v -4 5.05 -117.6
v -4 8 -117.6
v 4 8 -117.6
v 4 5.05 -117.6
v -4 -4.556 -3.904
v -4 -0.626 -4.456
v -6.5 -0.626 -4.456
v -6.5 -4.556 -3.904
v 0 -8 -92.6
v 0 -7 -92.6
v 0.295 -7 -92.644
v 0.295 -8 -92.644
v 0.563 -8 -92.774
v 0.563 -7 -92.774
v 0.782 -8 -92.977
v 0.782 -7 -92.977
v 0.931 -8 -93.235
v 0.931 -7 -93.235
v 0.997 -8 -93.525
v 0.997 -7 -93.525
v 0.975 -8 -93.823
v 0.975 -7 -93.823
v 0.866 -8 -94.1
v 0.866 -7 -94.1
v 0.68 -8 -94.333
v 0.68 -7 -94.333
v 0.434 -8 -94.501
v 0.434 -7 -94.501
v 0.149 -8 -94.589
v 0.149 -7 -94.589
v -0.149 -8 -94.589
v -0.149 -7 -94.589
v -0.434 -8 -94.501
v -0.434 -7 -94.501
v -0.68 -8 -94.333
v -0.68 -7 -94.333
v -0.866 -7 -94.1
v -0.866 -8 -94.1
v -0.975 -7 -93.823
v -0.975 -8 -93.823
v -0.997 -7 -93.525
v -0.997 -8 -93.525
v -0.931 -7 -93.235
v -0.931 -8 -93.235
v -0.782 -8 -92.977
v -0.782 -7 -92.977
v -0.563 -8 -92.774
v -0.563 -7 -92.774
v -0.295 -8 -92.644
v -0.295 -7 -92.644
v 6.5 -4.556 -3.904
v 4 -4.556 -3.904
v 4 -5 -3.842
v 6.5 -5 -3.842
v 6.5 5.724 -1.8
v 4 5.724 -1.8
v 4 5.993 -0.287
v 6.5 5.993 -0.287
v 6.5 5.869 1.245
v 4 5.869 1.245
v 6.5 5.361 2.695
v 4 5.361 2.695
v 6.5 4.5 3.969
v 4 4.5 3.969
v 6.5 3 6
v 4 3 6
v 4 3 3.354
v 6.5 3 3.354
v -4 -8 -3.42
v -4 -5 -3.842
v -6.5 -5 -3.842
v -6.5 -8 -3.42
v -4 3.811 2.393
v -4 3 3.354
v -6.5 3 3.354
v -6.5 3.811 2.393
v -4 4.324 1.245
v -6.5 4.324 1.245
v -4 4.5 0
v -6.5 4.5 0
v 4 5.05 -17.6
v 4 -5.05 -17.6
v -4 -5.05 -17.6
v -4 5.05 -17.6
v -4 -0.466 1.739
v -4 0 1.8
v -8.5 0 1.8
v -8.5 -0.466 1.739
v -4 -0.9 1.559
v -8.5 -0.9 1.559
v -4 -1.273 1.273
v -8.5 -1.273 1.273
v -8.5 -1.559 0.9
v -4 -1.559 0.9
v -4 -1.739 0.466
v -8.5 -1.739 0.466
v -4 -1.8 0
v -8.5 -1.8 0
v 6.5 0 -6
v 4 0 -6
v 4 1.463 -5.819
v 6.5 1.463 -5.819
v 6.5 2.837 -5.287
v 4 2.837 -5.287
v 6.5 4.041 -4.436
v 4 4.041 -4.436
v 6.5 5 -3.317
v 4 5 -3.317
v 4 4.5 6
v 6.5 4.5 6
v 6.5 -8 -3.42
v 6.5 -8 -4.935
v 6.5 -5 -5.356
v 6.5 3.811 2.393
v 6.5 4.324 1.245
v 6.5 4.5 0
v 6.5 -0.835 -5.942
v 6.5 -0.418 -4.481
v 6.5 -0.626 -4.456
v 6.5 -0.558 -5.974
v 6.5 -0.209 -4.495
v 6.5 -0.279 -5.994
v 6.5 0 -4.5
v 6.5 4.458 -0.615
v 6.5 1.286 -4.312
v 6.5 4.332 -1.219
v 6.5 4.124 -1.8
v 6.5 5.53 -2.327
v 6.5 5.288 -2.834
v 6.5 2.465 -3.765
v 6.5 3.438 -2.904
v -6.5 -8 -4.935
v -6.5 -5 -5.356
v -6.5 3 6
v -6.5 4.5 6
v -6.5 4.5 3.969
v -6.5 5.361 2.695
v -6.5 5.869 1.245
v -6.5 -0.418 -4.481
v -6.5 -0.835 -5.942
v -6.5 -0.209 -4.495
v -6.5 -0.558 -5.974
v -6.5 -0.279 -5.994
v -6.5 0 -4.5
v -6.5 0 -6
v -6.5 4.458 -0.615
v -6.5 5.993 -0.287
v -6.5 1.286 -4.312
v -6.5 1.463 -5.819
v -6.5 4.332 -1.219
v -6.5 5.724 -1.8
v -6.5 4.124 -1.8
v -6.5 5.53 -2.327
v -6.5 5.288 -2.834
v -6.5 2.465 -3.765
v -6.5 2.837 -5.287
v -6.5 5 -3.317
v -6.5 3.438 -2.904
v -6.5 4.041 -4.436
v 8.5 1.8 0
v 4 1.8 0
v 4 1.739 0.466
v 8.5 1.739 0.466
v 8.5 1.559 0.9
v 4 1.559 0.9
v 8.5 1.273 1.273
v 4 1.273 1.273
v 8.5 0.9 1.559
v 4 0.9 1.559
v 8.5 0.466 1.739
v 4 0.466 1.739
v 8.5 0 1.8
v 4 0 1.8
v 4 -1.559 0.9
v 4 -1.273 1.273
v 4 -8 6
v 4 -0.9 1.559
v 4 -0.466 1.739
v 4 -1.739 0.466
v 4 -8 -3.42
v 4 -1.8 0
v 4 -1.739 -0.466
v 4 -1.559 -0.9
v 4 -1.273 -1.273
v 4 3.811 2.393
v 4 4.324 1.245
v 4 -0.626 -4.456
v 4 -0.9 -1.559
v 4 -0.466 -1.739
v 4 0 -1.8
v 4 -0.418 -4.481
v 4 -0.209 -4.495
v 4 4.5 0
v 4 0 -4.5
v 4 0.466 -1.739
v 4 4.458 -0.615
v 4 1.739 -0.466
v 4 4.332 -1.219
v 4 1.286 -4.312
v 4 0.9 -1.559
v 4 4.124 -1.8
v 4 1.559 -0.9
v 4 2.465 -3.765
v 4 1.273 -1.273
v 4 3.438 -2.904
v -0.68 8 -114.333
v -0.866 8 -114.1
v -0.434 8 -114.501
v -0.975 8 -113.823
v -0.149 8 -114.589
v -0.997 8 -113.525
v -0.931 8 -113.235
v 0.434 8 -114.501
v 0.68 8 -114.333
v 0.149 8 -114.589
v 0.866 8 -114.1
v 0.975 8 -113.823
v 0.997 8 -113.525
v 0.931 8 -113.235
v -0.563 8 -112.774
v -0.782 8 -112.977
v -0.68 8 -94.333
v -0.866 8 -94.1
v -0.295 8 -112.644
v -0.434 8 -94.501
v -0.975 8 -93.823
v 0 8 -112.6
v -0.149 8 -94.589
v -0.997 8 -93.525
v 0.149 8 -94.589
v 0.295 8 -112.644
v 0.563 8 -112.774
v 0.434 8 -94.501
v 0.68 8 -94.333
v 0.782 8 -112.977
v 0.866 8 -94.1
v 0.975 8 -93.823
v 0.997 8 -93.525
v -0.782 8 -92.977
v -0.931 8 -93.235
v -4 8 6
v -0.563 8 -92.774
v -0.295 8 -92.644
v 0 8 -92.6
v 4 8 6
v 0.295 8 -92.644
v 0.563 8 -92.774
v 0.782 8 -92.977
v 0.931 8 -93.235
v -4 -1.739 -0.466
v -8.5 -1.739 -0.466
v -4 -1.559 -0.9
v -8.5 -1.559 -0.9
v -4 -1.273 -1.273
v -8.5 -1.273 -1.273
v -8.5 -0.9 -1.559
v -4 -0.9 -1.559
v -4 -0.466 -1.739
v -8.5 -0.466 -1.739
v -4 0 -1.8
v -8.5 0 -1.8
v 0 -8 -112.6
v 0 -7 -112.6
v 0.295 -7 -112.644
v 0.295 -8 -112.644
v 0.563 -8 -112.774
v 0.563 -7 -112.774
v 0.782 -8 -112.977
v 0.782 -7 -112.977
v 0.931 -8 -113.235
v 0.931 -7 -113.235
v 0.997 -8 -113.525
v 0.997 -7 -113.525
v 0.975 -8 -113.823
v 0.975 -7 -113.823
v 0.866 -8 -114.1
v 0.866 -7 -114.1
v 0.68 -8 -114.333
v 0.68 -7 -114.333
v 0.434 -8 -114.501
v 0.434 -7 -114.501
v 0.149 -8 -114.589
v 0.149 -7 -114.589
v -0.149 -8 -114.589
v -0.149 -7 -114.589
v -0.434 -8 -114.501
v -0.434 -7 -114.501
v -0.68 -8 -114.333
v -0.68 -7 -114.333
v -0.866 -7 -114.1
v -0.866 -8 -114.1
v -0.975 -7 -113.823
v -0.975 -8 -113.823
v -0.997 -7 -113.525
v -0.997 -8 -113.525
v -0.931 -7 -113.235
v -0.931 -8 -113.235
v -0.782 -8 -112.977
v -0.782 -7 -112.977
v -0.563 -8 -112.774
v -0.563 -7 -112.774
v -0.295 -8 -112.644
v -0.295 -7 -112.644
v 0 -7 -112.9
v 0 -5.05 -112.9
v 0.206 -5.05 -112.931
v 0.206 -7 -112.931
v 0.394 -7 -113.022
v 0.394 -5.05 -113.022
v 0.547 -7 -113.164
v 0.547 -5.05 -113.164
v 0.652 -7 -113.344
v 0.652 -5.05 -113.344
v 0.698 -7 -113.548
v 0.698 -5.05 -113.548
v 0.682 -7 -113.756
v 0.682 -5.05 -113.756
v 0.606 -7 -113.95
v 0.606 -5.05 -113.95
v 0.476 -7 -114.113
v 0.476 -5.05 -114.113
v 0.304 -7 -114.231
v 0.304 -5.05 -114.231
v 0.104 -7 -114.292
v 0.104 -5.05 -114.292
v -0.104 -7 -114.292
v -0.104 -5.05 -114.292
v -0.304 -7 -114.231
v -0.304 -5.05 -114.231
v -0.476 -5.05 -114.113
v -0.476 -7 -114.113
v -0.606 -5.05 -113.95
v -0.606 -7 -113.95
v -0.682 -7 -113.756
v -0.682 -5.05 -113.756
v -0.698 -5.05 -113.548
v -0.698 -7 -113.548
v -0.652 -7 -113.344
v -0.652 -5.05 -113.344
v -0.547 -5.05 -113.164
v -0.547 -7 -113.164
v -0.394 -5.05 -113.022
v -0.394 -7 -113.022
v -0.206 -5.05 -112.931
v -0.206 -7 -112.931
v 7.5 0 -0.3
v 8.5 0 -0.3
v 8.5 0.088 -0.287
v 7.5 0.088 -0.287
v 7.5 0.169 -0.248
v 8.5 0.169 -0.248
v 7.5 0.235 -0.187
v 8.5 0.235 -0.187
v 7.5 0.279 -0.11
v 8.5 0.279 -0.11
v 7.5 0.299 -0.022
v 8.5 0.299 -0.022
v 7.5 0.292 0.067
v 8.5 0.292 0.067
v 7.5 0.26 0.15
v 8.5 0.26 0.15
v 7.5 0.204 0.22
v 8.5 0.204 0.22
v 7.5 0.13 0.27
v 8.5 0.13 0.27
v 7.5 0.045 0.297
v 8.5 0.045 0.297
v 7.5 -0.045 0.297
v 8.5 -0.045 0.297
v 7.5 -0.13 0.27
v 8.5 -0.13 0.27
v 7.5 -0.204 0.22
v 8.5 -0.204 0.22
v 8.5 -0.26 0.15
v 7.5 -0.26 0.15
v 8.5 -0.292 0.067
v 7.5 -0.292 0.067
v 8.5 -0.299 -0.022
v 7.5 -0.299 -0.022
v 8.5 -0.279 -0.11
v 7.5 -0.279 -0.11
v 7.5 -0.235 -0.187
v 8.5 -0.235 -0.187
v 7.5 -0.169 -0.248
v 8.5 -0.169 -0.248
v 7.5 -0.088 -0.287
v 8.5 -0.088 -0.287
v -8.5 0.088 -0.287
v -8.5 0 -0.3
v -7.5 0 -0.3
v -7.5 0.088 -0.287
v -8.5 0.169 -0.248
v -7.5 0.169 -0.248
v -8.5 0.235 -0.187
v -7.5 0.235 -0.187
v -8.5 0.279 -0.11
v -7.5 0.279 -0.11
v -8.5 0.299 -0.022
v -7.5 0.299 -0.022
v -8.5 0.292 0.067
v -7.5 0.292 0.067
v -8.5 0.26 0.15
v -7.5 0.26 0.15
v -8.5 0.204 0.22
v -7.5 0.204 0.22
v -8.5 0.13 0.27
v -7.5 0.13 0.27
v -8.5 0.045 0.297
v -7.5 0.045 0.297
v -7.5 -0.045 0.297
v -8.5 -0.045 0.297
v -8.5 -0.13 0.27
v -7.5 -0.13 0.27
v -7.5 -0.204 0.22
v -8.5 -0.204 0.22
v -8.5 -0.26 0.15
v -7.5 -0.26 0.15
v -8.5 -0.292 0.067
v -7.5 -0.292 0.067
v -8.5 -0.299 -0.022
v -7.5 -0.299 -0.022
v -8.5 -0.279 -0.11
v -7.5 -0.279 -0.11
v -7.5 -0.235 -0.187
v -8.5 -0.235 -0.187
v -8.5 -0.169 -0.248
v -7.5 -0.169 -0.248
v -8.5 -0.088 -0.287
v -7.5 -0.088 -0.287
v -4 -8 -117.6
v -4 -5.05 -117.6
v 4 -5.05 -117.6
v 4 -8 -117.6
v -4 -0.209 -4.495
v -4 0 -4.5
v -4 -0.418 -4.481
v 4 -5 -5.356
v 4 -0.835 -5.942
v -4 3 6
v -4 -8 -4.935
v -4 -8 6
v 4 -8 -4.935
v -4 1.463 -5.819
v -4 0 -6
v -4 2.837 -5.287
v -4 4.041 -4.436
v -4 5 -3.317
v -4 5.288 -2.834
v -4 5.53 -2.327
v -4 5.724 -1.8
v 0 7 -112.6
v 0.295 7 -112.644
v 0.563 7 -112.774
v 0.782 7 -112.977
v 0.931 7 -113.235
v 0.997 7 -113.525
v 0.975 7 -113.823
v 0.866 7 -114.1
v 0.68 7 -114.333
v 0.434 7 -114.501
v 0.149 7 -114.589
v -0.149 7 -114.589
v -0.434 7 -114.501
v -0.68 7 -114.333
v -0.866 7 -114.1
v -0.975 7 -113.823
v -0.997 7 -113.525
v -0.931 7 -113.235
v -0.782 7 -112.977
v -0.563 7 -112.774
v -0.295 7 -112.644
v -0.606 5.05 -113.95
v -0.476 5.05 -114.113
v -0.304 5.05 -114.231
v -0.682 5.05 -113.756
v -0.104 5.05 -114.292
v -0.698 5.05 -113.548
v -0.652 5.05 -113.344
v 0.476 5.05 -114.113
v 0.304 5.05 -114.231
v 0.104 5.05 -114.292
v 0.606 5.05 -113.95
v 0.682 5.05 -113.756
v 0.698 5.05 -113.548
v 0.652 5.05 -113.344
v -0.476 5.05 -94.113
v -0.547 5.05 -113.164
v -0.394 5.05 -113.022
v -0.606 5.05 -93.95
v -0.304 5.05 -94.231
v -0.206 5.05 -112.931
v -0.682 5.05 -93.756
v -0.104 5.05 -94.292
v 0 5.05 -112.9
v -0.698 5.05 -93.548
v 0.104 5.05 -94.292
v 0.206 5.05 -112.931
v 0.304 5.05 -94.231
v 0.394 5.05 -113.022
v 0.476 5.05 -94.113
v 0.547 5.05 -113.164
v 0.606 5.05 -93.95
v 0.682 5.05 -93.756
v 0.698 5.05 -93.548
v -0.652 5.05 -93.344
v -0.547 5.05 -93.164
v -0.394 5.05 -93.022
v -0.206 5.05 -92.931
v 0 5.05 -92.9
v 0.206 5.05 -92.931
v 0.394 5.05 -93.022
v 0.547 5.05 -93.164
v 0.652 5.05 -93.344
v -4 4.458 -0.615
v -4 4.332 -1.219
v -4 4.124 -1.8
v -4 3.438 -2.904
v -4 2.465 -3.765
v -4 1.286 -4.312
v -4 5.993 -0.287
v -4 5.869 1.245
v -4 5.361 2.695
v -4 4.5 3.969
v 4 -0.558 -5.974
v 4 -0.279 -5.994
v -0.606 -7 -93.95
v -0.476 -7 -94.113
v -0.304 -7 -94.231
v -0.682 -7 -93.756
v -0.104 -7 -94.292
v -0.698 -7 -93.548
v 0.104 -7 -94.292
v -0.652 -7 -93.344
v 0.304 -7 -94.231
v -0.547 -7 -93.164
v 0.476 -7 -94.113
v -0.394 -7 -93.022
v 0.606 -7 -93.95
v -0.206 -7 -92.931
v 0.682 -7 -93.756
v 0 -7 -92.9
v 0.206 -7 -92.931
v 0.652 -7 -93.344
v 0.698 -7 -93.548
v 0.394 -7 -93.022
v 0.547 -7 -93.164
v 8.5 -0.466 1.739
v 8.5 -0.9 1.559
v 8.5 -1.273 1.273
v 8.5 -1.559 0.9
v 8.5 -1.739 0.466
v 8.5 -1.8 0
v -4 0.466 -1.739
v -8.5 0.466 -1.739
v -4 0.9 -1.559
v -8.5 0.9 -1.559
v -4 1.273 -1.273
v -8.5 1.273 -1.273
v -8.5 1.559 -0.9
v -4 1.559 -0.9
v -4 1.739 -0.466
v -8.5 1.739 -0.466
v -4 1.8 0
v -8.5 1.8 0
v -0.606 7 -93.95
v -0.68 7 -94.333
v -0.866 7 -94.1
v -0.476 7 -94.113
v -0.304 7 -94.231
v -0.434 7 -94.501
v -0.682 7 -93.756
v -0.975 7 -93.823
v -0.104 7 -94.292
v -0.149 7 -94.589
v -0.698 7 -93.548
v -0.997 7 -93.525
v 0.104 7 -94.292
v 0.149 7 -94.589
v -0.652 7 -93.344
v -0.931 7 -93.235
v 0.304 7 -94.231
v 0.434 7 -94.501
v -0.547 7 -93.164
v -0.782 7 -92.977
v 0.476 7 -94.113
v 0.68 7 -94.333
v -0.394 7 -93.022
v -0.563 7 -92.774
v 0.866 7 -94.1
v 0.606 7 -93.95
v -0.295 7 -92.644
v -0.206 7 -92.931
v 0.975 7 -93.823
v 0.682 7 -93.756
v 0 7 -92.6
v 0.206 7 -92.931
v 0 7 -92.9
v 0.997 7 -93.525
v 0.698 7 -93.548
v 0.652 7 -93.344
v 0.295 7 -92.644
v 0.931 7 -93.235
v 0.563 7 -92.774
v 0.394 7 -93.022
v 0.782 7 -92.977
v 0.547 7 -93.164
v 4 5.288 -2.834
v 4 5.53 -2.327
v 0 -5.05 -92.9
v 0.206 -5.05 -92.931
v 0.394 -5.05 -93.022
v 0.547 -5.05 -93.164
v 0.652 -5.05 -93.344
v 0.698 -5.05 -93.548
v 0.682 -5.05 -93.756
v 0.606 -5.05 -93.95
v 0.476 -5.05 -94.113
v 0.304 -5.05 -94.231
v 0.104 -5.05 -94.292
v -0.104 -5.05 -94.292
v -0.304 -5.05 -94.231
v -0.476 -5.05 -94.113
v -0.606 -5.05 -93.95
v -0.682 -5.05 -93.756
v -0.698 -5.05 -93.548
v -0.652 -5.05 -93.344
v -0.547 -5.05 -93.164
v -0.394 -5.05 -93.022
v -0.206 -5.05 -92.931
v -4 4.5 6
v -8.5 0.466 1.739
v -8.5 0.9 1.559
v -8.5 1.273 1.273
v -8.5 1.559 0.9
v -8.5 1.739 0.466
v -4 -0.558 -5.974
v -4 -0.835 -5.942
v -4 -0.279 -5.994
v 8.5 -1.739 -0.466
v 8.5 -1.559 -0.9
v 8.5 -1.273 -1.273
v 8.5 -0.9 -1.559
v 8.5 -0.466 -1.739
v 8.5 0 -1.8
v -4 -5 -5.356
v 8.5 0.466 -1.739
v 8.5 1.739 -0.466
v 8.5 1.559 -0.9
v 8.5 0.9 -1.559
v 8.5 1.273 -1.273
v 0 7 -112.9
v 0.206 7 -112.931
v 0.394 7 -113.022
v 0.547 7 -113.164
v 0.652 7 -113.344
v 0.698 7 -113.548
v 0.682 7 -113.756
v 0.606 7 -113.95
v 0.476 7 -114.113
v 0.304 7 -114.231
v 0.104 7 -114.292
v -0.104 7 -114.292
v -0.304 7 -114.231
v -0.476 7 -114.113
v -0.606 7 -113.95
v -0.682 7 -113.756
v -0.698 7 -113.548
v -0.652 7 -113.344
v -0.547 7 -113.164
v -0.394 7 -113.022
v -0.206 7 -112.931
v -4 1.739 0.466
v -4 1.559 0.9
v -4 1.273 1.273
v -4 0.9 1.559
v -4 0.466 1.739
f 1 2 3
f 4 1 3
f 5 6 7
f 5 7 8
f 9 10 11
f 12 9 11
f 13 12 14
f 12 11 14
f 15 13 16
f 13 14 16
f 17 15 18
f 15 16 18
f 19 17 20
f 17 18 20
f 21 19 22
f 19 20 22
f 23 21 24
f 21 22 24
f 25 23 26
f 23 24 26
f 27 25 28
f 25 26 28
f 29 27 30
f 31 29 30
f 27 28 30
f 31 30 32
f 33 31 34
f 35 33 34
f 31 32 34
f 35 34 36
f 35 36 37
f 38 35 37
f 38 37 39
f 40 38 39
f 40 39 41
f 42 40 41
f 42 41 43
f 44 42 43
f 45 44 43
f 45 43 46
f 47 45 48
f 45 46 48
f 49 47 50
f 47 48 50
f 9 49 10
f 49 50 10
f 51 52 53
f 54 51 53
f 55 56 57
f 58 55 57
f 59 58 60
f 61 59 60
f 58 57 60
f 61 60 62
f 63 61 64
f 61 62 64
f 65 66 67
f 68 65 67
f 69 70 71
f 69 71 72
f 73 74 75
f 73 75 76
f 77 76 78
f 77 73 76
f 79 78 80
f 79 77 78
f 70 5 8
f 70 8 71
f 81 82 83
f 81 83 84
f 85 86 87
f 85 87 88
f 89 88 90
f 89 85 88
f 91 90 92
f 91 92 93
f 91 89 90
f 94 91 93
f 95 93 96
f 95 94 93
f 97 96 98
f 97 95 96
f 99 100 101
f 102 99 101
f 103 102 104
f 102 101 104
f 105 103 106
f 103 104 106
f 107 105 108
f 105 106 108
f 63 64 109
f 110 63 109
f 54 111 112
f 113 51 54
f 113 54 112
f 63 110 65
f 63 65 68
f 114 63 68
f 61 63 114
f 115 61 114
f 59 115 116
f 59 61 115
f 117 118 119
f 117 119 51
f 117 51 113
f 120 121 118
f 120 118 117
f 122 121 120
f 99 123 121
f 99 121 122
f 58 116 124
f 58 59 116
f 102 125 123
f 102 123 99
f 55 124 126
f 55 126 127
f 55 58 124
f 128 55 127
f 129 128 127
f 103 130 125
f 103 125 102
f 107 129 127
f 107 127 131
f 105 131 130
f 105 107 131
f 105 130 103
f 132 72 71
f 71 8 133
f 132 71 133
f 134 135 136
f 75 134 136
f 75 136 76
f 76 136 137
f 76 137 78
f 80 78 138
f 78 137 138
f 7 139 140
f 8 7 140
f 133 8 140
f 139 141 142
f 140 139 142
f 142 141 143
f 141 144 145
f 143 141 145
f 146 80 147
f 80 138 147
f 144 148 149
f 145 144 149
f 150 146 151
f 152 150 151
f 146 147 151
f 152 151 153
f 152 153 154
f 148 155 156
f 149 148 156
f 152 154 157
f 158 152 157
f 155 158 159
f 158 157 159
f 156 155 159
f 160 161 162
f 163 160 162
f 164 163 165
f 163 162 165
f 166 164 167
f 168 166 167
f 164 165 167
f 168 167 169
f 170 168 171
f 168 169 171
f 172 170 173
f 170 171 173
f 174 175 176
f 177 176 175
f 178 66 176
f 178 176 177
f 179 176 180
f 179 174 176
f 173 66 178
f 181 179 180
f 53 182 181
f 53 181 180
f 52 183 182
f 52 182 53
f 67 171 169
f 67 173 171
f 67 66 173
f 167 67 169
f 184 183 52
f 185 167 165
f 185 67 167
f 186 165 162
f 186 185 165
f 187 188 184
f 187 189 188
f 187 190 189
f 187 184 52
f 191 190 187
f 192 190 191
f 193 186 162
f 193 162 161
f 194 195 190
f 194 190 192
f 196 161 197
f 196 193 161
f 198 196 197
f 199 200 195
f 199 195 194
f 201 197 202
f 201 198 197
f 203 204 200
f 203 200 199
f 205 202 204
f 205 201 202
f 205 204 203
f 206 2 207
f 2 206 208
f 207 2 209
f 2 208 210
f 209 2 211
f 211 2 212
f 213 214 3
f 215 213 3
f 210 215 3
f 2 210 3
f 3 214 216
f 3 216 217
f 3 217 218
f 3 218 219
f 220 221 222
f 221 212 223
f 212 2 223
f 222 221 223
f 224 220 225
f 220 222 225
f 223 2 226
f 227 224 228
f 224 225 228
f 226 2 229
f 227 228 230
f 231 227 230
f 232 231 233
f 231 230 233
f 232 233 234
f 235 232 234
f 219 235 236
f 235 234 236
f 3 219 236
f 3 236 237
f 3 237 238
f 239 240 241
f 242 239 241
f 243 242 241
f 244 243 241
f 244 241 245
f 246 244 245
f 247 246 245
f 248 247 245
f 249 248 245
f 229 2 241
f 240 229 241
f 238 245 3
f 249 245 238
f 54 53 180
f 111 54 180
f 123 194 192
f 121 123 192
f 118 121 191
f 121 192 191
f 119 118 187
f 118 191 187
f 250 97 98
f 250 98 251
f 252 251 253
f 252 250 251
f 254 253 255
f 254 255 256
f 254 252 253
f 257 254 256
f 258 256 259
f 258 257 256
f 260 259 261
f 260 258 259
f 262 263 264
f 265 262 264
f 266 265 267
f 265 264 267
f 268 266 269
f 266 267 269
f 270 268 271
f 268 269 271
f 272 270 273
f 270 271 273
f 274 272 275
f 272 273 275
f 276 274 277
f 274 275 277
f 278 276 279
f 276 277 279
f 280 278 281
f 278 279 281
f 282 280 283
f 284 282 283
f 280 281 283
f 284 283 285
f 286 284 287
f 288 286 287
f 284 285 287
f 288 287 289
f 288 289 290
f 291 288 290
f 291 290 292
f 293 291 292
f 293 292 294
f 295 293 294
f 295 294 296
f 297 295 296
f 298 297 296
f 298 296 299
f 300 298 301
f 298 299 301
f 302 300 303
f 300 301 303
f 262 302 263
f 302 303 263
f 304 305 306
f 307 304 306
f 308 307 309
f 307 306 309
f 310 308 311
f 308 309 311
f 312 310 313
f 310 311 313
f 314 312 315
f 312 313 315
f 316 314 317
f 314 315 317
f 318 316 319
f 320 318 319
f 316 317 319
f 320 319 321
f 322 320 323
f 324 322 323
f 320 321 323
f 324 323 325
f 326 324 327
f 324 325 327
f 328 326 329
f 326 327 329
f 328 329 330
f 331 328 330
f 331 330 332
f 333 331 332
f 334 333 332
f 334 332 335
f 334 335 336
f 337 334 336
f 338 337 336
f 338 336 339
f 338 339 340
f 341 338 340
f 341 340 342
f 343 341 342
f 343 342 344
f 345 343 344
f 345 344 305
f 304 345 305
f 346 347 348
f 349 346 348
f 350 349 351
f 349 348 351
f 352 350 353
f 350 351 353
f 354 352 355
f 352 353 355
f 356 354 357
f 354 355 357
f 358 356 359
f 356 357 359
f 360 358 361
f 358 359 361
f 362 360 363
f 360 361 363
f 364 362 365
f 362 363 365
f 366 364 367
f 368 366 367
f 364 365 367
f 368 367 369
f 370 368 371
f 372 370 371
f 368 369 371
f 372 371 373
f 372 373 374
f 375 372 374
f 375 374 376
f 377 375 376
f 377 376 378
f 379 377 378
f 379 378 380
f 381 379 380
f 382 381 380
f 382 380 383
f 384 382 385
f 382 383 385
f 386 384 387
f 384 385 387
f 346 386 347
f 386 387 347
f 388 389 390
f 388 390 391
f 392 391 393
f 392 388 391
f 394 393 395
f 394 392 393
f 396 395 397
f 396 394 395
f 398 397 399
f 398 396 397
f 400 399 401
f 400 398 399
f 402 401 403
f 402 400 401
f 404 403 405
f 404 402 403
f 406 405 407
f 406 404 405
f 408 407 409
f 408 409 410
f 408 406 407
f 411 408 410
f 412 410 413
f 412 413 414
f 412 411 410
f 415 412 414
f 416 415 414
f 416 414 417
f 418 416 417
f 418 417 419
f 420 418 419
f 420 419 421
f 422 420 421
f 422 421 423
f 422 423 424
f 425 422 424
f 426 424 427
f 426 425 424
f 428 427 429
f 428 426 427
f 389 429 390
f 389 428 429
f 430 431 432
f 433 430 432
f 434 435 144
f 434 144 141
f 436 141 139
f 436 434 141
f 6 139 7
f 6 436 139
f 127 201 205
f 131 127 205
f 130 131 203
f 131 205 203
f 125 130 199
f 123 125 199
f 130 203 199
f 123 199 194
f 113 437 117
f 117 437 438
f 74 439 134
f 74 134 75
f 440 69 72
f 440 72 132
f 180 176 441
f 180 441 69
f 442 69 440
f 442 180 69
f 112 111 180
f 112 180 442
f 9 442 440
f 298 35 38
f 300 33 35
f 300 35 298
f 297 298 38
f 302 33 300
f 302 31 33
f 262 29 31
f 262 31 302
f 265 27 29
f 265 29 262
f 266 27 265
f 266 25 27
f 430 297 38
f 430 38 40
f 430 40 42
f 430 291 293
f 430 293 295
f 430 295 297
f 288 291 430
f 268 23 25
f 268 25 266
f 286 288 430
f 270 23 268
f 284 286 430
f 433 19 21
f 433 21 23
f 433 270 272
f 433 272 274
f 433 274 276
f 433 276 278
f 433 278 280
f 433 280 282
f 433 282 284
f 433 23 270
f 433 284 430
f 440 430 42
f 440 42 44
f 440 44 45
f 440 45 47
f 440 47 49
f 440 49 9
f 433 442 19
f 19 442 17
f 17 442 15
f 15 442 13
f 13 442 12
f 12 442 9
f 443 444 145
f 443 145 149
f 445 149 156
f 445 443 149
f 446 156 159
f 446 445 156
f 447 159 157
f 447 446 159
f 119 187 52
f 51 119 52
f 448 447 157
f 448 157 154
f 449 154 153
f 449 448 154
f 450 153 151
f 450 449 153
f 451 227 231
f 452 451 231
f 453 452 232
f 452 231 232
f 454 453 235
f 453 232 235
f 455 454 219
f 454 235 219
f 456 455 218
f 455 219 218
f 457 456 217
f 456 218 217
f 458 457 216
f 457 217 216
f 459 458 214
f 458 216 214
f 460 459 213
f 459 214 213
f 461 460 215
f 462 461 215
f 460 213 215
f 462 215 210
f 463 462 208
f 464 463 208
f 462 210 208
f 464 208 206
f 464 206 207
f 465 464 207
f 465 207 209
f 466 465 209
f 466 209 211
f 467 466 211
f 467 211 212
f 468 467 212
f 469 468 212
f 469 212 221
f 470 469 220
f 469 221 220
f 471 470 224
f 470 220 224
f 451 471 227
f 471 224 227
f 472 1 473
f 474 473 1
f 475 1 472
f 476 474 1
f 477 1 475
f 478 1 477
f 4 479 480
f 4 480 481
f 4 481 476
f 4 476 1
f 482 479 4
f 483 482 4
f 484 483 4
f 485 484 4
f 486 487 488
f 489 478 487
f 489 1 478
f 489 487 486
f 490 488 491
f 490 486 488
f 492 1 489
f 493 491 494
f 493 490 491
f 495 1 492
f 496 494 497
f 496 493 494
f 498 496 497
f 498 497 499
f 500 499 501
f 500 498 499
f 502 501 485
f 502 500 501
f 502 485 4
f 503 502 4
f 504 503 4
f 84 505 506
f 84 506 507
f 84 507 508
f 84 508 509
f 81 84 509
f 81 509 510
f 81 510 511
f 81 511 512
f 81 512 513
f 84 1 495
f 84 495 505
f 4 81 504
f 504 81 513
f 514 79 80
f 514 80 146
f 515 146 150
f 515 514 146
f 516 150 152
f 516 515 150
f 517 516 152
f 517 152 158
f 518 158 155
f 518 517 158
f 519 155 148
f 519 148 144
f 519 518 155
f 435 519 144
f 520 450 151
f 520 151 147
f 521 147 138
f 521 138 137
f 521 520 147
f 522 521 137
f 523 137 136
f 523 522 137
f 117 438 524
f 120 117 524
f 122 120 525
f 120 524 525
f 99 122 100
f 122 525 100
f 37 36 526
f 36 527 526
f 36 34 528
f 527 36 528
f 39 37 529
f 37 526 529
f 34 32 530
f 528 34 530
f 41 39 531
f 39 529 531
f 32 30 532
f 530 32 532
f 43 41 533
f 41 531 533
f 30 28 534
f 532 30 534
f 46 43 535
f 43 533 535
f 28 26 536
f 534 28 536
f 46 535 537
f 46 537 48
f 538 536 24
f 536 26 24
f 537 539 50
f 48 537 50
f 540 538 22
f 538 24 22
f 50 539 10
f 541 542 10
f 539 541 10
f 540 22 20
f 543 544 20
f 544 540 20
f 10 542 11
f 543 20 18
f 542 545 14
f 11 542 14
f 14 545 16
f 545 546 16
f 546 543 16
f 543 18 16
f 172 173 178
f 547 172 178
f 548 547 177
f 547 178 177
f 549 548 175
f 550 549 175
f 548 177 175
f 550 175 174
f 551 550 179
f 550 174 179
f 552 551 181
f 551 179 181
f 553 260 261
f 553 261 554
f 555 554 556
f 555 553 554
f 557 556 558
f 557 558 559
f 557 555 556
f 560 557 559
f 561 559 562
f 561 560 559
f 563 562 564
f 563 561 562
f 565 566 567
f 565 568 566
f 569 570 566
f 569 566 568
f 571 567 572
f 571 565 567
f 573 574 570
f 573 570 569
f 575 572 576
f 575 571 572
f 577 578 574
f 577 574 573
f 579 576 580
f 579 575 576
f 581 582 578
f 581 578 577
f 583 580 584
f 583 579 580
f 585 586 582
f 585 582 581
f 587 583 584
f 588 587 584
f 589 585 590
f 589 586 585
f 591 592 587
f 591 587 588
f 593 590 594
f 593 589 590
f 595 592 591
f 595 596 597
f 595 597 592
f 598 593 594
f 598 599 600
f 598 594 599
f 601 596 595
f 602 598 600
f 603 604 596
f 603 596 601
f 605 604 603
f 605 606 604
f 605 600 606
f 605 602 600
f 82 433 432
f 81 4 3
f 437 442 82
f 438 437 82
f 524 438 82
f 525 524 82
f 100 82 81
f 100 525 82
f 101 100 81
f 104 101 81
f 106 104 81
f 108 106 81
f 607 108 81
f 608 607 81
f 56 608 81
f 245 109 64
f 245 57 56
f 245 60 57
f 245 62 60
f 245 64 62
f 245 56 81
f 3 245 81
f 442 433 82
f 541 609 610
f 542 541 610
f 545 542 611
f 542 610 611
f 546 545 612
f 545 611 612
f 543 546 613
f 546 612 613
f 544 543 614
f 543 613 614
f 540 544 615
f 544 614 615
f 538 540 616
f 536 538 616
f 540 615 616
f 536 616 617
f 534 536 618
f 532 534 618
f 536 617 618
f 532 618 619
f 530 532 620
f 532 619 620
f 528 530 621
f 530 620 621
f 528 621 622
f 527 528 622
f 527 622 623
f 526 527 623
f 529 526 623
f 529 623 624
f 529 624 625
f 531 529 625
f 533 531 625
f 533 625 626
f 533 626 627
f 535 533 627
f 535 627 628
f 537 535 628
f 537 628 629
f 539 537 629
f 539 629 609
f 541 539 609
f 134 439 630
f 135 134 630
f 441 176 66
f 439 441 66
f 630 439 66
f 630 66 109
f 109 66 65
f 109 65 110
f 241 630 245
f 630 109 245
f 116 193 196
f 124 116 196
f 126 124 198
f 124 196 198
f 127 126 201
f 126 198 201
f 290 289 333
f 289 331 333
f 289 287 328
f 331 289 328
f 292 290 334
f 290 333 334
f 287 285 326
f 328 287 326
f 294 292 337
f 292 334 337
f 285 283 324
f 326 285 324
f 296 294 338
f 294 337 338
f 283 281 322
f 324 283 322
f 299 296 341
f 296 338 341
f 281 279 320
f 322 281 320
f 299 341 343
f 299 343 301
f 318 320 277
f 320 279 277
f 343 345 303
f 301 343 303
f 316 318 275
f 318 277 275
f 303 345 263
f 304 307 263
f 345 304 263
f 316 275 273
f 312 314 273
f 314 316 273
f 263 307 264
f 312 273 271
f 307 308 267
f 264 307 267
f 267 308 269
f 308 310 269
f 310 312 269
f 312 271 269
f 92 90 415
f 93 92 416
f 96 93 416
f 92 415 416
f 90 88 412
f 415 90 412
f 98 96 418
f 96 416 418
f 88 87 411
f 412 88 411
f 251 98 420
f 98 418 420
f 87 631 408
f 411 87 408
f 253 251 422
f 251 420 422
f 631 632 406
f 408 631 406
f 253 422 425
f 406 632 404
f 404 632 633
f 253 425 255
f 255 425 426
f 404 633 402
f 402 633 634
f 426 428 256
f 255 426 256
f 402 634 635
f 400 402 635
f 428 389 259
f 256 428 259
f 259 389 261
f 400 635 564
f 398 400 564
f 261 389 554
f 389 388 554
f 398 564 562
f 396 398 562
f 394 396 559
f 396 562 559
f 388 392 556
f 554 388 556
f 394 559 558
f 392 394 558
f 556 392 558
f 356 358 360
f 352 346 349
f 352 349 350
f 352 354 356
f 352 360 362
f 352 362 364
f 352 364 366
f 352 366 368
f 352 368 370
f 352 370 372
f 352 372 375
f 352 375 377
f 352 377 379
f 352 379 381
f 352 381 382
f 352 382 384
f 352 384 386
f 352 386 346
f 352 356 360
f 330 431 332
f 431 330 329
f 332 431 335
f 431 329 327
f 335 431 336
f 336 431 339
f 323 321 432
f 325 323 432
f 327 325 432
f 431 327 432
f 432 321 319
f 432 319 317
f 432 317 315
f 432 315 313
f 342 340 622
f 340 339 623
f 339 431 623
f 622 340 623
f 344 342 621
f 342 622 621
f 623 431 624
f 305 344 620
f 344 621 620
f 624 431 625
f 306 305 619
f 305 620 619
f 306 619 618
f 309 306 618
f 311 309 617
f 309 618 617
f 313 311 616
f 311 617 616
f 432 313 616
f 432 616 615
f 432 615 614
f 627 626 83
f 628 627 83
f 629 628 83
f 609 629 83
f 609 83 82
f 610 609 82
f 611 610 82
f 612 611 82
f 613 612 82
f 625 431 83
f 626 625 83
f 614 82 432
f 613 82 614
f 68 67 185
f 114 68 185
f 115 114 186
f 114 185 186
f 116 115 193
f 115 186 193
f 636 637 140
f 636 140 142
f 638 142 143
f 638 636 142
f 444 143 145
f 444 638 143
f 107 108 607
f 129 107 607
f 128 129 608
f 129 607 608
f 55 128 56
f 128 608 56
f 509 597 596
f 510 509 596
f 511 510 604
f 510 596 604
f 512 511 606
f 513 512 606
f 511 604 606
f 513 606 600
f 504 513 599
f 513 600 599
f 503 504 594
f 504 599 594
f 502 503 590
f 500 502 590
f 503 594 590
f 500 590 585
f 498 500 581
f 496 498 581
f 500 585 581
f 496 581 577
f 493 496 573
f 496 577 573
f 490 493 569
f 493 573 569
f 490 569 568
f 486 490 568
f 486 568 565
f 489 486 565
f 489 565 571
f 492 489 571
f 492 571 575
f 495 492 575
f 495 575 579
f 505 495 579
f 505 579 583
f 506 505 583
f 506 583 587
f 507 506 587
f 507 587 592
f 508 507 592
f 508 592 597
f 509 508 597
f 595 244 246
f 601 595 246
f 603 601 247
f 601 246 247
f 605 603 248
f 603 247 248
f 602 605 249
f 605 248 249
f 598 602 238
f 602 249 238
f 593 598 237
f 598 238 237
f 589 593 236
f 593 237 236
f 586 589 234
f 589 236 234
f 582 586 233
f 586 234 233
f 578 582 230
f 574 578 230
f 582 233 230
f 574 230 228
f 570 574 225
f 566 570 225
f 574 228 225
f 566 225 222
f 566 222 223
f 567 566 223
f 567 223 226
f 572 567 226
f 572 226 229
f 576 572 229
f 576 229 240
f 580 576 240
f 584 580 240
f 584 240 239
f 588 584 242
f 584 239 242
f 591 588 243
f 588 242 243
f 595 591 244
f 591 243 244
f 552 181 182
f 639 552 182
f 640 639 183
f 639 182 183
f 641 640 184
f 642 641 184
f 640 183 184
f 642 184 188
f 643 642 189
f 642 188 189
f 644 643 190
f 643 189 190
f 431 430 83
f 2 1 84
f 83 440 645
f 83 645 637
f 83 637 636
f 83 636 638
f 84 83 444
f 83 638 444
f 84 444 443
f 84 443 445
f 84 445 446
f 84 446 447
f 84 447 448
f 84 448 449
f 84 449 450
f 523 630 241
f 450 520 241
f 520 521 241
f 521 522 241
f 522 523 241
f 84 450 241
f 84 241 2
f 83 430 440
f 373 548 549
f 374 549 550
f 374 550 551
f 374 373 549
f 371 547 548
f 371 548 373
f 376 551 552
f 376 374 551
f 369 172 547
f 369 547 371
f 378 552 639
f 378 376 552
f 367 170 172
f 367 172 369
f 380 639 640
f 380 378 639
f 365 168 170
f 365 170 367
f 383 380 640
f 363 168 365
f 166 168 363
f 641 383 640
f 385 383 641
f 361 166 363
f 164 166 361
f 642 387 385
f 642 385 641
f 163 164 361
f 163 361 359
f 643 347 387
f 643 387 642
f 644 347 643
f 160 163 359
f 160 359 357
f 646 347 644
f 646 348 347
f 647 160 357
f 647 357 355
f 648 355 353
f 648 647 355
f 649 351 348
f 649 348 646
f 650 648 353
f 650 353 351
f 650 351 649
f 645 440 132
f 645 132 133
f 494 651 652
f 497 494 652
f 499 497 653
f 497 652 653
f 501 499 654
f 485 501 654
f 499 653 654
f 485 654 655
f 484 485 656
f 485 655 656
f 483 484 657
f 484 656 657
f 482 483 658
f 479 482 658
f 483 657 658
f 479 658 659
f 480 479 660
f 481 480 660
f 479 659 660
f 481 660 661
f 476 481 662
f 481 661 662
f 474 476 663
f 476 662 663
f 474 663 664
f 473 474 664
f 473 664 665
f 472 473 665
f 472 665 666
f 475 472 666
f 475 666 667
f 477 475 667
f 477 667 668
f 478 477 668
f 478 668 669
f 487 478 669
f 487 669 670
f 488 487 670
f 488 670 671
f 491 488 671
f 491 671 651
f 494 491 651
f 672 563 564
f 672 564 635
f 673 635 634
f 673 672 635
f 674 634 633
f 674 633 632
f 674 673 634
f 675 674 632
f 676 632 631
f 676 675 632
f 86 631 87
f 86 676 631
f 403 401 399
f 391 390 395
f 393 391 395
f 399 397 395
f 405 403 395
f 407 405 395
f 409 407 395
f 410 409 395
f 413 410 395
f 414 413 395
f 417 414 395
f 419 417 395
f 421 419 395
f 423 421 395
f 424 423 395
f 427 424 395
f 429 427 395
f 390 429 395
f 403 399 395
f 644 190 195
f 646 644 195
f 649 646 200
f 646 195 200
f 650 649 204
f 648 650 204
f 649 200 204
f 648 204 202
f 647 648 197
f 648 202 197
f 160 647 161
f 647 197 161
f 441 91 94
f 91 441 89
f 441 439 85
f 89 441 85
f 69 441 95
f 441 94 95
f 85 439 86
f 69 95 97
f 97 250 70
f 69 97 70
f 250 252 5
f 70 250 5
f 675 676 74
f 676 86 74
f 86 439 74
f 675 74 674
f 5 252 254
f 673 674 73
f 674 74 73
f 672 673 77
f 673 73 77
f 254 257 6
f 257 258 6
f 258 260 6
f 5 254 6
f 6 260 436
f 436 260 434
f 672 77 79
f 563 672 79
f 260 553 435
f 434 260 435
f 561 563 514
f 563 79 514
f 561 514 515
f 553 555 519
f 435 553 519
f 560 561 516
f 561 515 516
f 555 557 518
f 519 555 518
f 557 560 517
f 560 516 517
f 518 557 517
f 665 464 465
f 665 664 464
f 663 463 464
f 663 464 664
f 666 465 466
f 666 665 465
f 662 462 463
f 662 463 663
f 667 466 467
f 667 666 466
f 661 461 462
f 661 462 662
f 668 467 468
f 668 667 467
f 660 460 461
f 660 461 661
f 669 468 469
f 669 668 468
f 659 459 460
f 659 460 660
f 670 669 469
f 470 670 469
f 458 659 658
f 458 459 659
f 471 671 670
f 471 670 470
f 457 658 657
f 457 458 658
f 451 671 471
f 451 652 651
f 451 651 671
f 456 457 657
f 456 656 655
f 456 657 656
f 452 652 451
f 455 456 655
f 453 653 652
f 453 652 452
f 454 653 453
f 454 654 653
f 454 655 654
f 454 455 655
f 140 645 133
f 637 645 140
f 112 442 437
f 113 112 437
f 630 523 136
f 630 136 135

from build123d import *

# Parameters (mm, degrees)
SKETCH_2_W           = 23.6
SKETCH_2_H           = 16
EXTRUDE_1_DEPTH      = 4
EXTRUDE_START        = 4
EXTRUDE_3_DEPTH      = 4.5
SKETCH_5_R           = 0.3
CUT_EXTRUDE_10_DEPTH = 1
EXTRUDE_2_DEPTH      = 2.5
SKETCH_6_W           = 4
SKETCH_6_H           = 2.95
EXTRUDE_4_DEPTH      = 100
SKETCH_7_R           = 0.7
CUT_EXTRUDE_11_DEPTH = 119.987436312
SKETCH_7_3_R         = 1
SKETCH_7_3_R_2       = 0.7
CUT_EXTRUDE_12_DEPTH = 1
CUT_EXTRUDE_START    = -15
SKETCH_7_4_R         = 1
SKETCH_7_4_R_2       = 0.7
CUT_EXTRUDE_13_DEPTH = 1


with BuildPart() as part:
    # 草图2 → 凸台-拉伸1 (new body)
    with BuildSketch(Plane(origin=(0, 0, 0), x_dir=(0, 0, -1), z_dir=(1, 0, 0))):
        with Locations((5.8, 0)):
            Rectangle(SKETCH_2_W, SKETCH_2_H)
    extrude(amount=EXTRUDE_1_DEPTH)

    # 草图2<10> → 凸台-拉伸3 (add)
    with BuildSketch(Plane(origin=(0, 0, 0), x_dir=(0, 0, -1), z_dir=(1, 0, 0)).offset(EXTRUDE_START)):
        with BuildLine():
            ThreePointArc((0, -1.8), (1.272792206, -1.272792206), (1.8, 0))
            Line((1.8, 0), (0, 0))
            Line((0, 0), (0, -1.8))
        make_face()
        with BuildLine():
            Line((0, 0), (1.8, 0))
            ThreePointArc((1.8, 0), (1.272792206, 1.272792206), (0, 1.8))
            Line((0, 1.8), (0, 0))
        make_face()
        with BuildLine():
            Line((0, -1.8), (0, 0))
            Line((0, 0), (-1.8, 0))
            ThreePointArc((-1.8, 0), (-1.272792206, -1.272792206), (0, -1.8))
        make_face()
        with BuildLine():
            Line((-1.8, 0), (0, 0))
            Line((0, 0), (0, 1.8))
            ThreePointArc((0, 1.8), (-1.272792206, 1.272792206), (-1.8, 0))
        make_face()
    extrude(amount=EXTRUDE_3_DEPTH)

    # 草图5 → 切除-拉伸10 (cut)
    with BuildSketch(Plane(origin=(8.5, 0, 0), x_dir=(0, 0, -1), z_dir=(1, 0, 0))):
        Circle(SKETCH_5_R)
    extrude(amount=-CUT_EXTRUDE_10_DEPTH, mode=Mode.SUBTRACT)

    # 草图2<4> → 凸台-拉伸2 (add)
    with BuildSketch(Plane(origin=(0, 0, 0), x_dir=(0, 0, -1), z_dir=(1, 0, 0)).offset(EXTRUDE_START)):
        with BuildLine():
            ThreePointArc((-3.354101966, 3), (-1.837117307, 4.107919181), (0, 4.5))
            Line((0, 4.5), (-3.968626967, 4.5))
            ThreePointArc((-3.968626967, 4.5), (-4.643360347, 3.799895352), (-5.196152423, 3))
            Line((-5.196152423, 3), (-3.354101966, 3))
        make_face()
        with BuildLine():
            Line((0, 5), (1.8, 5))
            Line((1.8, 5), (1.8, 5.723635209))
            ThreePointArc((1.8, 5.723635209), (-1.245012655, 5.869407422), (-3.968626967, 4.5))
            Line((-3.968626967, 4.5), (0, 4.5))
            Line((0, 4.5), (0, 5))
        make_face()
        with BuildLine():
            ThreePointArc((0, 4.5), (0.919393397, 4.405078408), (1.8, 4.124318125))
            Line((1.8, 4.124318125), (1.8, 5))
            Line((1.8, 5), (0, 5))
            Line((0, 5), (0, 4.5))
        make_face()
        with BuildLine():
            ThreePointArc((1.8, 4.124318125), (3.764970119, 2.464751509), (4.5, 0))
            Line((4.5, 0), (6, 0))
            ThreePointArc((6, 0), (5.286764074, 2.837274331), (3.31662479, 5))
            Line((3.31662479, 5), (1.8, 5))
            Line((1.8, 5), (1.8, 4.124318125))
        make_face()
        with BuildLine():
            Line((1.8, 5.723635209), (1.8, 5))
            Line((1.8, 5), (3.31662479, 5))
            ThreePointArc((3.31662479, 5), (2.583771331, 5.415175501), (1.8, 5.723635209))
        make_face()
        with BuildLine():
            Line((6, 0), (4.5, 0))
            ThreePointArc((4.5, 0), (4.489038226, -0.313904132), (4.456206309, -0.626278954))
            Line((4.456206309, -0.626278954), (3.903880188, -4.556283516))
            ThreePointArc((3.903880188, -4.556283516), (5.262635021, -2.881782892), (5.941608412, -0.835038606))
            ThreePointArc((5.941608412, -0.835038606), (5.985384302, -0.418538842), (6, 0))
        make_face()
        with BuildLine():
            Line((5.356261262, -5), (5.941608412, -0.835038606))
            ThreePointArc((5.941608412, -0.835038606), (5.262635021, -2.881782892), (3.903880188, -4.556283516))
            Line((3.903880188, -4.556283516), (3.841519903, -5))
            Line((3.841519903, -5), (5.356261262, -5))
        make_face()
        Polygon((4.934638757, -8), (5.356261262, -5), (3.841519903, -5), (3.419897399, -8), align=None)
        with BuildLine():
            ThreePointArc((-5.196152423, 3), (-4.643360347, 3.799895352), (-3.968626967, 4.5))
            Line((-3.968626967, 4.5), (-6, 4.5))
            Line((-6, 4.5), (-6, 3))
            Line((-6, 3), (-5.196152423, 3))
        make_face()
    extrude(amount=EXTRUDE_2_DEPTH)

    # 草图6 → 凸台-拉伸4 (add)
    with BuildSketch(Plane(origin=(0, 0, -17.6), x_dir=(-1, 0, 0), z_dir=(0, 0, -1))):
        with Locations((-2, 6.525)):
            Rectangle(SKETCH_6_W, SKETCH_6_H)
        with Locations((-2, -6.525)):
            Rectangle(SKETCH_6_W, SKETCH_6_H)
    extrude(amount=EXTRUDE_4_DEPTH)

    # 镜向1: part across plane


with BuildPart() as part_1:
    add(part.part)
    add(part.part.mirror(Plane(origin=(0, 0, 0), x_dir=(0, 0, 1), z_dir=(1, 0, 0))))

    # 草图7 → 切除-拉伸11 (cut, through all)
    with BuildSketch(Plane(origin=(0, 8, 0), x_dir=(1, 0, 0), z_dir=(0, 1, 0))):
        with Locations(Location((0, 113.6, 0), (0, 0, 270))):
            Circle(SKETCH_7_R)
        with Locations(Location((0, 93.6, 0), (0, 0, 270))):
            Circle(SKETCH_7_R)
    extrude(amount=-CUT_EXTRUDE_11_DEPTH, mode=Mode.SUBTRACT)

    # 草图7<3> → 切除-拉伸12 (cut)
    # profile 1 of 2: a face of its own
    with BuildSketch(Plane(origin=(0, 8, 0), x_dir=(1, 0, 0), z_dir=(0, 1, 0))):
        with Locations(Location((0, 93.6, 0), (0, 0, 270))):
            Circle(SKETCH_7_3_R)
        with Locations(Location((0, 93.6, 0), (0, 0, 270))):
            Circle(SKETCH_7_3_R_2, mode=Mode.SUBTRACT)
    # profile 2 of 2: a face of its own
    with BuildSketch(Plane(origin=(0, 8, 0), x_dir=(1, 0, 0), z_dir=(0, 1, 0))):
        with Locations(Location((0, 113.6, 0), (0, 0, 270))):
            Circle(SKETCH_7_3_R)
        with Locations(Location((0, 113.6, 0), (0, 0, 270))):
            Circle(SKETCH_7_3_R_2, mode=Mode.SUBTRACT)
    extrude(amount=-CUT_EXTRUDE_12_DEPTH, mode=Mode.SUBTRACT)

    # 草图7<4> → 切除-拉伸13 (cut)
    # profile 1 of 2: a face of its own
    with BuildSketch(Plane(origin=(0, 8, 0), x_dir=(1, 0, 0), z_dir=(0, 1, 0)).offset(CUT_EXTRUDE_START)):
        with Locations(Location((0, 93.6, 0), (0, 0, 270))):
            Circle(SKETCH_7_4_R)
        with Locations(Location((0, 93.6, 0), (0, 0, 270))):
            Circle(SKETCH_7_4_R_2, mode=Mode.SUBTRACT)
    # profile 2 of 2: a face of its own
    with BuildSketch(Plane(origin=(0, 8, 0), x_dir=(1, 0, 0), z_dir=(0, 1, 0)).offset(CUT_EXTRUDE_START)):
        with Locations(Location((0, 113.6, 0), (0, 0, 270))):
            Circle(SKETCH_7_4_R)
        with Locations(Location((0, 113.6, 0), (0, 0, 270))):
            Circle(SKETCH_7_4_R_2, mode=Mode.SUBTRACT)
    extrude(amount=-CUT_EXTRUDE_13_DEPTH, mode=Mode.SUBTRACT)


solid = part_1.part
